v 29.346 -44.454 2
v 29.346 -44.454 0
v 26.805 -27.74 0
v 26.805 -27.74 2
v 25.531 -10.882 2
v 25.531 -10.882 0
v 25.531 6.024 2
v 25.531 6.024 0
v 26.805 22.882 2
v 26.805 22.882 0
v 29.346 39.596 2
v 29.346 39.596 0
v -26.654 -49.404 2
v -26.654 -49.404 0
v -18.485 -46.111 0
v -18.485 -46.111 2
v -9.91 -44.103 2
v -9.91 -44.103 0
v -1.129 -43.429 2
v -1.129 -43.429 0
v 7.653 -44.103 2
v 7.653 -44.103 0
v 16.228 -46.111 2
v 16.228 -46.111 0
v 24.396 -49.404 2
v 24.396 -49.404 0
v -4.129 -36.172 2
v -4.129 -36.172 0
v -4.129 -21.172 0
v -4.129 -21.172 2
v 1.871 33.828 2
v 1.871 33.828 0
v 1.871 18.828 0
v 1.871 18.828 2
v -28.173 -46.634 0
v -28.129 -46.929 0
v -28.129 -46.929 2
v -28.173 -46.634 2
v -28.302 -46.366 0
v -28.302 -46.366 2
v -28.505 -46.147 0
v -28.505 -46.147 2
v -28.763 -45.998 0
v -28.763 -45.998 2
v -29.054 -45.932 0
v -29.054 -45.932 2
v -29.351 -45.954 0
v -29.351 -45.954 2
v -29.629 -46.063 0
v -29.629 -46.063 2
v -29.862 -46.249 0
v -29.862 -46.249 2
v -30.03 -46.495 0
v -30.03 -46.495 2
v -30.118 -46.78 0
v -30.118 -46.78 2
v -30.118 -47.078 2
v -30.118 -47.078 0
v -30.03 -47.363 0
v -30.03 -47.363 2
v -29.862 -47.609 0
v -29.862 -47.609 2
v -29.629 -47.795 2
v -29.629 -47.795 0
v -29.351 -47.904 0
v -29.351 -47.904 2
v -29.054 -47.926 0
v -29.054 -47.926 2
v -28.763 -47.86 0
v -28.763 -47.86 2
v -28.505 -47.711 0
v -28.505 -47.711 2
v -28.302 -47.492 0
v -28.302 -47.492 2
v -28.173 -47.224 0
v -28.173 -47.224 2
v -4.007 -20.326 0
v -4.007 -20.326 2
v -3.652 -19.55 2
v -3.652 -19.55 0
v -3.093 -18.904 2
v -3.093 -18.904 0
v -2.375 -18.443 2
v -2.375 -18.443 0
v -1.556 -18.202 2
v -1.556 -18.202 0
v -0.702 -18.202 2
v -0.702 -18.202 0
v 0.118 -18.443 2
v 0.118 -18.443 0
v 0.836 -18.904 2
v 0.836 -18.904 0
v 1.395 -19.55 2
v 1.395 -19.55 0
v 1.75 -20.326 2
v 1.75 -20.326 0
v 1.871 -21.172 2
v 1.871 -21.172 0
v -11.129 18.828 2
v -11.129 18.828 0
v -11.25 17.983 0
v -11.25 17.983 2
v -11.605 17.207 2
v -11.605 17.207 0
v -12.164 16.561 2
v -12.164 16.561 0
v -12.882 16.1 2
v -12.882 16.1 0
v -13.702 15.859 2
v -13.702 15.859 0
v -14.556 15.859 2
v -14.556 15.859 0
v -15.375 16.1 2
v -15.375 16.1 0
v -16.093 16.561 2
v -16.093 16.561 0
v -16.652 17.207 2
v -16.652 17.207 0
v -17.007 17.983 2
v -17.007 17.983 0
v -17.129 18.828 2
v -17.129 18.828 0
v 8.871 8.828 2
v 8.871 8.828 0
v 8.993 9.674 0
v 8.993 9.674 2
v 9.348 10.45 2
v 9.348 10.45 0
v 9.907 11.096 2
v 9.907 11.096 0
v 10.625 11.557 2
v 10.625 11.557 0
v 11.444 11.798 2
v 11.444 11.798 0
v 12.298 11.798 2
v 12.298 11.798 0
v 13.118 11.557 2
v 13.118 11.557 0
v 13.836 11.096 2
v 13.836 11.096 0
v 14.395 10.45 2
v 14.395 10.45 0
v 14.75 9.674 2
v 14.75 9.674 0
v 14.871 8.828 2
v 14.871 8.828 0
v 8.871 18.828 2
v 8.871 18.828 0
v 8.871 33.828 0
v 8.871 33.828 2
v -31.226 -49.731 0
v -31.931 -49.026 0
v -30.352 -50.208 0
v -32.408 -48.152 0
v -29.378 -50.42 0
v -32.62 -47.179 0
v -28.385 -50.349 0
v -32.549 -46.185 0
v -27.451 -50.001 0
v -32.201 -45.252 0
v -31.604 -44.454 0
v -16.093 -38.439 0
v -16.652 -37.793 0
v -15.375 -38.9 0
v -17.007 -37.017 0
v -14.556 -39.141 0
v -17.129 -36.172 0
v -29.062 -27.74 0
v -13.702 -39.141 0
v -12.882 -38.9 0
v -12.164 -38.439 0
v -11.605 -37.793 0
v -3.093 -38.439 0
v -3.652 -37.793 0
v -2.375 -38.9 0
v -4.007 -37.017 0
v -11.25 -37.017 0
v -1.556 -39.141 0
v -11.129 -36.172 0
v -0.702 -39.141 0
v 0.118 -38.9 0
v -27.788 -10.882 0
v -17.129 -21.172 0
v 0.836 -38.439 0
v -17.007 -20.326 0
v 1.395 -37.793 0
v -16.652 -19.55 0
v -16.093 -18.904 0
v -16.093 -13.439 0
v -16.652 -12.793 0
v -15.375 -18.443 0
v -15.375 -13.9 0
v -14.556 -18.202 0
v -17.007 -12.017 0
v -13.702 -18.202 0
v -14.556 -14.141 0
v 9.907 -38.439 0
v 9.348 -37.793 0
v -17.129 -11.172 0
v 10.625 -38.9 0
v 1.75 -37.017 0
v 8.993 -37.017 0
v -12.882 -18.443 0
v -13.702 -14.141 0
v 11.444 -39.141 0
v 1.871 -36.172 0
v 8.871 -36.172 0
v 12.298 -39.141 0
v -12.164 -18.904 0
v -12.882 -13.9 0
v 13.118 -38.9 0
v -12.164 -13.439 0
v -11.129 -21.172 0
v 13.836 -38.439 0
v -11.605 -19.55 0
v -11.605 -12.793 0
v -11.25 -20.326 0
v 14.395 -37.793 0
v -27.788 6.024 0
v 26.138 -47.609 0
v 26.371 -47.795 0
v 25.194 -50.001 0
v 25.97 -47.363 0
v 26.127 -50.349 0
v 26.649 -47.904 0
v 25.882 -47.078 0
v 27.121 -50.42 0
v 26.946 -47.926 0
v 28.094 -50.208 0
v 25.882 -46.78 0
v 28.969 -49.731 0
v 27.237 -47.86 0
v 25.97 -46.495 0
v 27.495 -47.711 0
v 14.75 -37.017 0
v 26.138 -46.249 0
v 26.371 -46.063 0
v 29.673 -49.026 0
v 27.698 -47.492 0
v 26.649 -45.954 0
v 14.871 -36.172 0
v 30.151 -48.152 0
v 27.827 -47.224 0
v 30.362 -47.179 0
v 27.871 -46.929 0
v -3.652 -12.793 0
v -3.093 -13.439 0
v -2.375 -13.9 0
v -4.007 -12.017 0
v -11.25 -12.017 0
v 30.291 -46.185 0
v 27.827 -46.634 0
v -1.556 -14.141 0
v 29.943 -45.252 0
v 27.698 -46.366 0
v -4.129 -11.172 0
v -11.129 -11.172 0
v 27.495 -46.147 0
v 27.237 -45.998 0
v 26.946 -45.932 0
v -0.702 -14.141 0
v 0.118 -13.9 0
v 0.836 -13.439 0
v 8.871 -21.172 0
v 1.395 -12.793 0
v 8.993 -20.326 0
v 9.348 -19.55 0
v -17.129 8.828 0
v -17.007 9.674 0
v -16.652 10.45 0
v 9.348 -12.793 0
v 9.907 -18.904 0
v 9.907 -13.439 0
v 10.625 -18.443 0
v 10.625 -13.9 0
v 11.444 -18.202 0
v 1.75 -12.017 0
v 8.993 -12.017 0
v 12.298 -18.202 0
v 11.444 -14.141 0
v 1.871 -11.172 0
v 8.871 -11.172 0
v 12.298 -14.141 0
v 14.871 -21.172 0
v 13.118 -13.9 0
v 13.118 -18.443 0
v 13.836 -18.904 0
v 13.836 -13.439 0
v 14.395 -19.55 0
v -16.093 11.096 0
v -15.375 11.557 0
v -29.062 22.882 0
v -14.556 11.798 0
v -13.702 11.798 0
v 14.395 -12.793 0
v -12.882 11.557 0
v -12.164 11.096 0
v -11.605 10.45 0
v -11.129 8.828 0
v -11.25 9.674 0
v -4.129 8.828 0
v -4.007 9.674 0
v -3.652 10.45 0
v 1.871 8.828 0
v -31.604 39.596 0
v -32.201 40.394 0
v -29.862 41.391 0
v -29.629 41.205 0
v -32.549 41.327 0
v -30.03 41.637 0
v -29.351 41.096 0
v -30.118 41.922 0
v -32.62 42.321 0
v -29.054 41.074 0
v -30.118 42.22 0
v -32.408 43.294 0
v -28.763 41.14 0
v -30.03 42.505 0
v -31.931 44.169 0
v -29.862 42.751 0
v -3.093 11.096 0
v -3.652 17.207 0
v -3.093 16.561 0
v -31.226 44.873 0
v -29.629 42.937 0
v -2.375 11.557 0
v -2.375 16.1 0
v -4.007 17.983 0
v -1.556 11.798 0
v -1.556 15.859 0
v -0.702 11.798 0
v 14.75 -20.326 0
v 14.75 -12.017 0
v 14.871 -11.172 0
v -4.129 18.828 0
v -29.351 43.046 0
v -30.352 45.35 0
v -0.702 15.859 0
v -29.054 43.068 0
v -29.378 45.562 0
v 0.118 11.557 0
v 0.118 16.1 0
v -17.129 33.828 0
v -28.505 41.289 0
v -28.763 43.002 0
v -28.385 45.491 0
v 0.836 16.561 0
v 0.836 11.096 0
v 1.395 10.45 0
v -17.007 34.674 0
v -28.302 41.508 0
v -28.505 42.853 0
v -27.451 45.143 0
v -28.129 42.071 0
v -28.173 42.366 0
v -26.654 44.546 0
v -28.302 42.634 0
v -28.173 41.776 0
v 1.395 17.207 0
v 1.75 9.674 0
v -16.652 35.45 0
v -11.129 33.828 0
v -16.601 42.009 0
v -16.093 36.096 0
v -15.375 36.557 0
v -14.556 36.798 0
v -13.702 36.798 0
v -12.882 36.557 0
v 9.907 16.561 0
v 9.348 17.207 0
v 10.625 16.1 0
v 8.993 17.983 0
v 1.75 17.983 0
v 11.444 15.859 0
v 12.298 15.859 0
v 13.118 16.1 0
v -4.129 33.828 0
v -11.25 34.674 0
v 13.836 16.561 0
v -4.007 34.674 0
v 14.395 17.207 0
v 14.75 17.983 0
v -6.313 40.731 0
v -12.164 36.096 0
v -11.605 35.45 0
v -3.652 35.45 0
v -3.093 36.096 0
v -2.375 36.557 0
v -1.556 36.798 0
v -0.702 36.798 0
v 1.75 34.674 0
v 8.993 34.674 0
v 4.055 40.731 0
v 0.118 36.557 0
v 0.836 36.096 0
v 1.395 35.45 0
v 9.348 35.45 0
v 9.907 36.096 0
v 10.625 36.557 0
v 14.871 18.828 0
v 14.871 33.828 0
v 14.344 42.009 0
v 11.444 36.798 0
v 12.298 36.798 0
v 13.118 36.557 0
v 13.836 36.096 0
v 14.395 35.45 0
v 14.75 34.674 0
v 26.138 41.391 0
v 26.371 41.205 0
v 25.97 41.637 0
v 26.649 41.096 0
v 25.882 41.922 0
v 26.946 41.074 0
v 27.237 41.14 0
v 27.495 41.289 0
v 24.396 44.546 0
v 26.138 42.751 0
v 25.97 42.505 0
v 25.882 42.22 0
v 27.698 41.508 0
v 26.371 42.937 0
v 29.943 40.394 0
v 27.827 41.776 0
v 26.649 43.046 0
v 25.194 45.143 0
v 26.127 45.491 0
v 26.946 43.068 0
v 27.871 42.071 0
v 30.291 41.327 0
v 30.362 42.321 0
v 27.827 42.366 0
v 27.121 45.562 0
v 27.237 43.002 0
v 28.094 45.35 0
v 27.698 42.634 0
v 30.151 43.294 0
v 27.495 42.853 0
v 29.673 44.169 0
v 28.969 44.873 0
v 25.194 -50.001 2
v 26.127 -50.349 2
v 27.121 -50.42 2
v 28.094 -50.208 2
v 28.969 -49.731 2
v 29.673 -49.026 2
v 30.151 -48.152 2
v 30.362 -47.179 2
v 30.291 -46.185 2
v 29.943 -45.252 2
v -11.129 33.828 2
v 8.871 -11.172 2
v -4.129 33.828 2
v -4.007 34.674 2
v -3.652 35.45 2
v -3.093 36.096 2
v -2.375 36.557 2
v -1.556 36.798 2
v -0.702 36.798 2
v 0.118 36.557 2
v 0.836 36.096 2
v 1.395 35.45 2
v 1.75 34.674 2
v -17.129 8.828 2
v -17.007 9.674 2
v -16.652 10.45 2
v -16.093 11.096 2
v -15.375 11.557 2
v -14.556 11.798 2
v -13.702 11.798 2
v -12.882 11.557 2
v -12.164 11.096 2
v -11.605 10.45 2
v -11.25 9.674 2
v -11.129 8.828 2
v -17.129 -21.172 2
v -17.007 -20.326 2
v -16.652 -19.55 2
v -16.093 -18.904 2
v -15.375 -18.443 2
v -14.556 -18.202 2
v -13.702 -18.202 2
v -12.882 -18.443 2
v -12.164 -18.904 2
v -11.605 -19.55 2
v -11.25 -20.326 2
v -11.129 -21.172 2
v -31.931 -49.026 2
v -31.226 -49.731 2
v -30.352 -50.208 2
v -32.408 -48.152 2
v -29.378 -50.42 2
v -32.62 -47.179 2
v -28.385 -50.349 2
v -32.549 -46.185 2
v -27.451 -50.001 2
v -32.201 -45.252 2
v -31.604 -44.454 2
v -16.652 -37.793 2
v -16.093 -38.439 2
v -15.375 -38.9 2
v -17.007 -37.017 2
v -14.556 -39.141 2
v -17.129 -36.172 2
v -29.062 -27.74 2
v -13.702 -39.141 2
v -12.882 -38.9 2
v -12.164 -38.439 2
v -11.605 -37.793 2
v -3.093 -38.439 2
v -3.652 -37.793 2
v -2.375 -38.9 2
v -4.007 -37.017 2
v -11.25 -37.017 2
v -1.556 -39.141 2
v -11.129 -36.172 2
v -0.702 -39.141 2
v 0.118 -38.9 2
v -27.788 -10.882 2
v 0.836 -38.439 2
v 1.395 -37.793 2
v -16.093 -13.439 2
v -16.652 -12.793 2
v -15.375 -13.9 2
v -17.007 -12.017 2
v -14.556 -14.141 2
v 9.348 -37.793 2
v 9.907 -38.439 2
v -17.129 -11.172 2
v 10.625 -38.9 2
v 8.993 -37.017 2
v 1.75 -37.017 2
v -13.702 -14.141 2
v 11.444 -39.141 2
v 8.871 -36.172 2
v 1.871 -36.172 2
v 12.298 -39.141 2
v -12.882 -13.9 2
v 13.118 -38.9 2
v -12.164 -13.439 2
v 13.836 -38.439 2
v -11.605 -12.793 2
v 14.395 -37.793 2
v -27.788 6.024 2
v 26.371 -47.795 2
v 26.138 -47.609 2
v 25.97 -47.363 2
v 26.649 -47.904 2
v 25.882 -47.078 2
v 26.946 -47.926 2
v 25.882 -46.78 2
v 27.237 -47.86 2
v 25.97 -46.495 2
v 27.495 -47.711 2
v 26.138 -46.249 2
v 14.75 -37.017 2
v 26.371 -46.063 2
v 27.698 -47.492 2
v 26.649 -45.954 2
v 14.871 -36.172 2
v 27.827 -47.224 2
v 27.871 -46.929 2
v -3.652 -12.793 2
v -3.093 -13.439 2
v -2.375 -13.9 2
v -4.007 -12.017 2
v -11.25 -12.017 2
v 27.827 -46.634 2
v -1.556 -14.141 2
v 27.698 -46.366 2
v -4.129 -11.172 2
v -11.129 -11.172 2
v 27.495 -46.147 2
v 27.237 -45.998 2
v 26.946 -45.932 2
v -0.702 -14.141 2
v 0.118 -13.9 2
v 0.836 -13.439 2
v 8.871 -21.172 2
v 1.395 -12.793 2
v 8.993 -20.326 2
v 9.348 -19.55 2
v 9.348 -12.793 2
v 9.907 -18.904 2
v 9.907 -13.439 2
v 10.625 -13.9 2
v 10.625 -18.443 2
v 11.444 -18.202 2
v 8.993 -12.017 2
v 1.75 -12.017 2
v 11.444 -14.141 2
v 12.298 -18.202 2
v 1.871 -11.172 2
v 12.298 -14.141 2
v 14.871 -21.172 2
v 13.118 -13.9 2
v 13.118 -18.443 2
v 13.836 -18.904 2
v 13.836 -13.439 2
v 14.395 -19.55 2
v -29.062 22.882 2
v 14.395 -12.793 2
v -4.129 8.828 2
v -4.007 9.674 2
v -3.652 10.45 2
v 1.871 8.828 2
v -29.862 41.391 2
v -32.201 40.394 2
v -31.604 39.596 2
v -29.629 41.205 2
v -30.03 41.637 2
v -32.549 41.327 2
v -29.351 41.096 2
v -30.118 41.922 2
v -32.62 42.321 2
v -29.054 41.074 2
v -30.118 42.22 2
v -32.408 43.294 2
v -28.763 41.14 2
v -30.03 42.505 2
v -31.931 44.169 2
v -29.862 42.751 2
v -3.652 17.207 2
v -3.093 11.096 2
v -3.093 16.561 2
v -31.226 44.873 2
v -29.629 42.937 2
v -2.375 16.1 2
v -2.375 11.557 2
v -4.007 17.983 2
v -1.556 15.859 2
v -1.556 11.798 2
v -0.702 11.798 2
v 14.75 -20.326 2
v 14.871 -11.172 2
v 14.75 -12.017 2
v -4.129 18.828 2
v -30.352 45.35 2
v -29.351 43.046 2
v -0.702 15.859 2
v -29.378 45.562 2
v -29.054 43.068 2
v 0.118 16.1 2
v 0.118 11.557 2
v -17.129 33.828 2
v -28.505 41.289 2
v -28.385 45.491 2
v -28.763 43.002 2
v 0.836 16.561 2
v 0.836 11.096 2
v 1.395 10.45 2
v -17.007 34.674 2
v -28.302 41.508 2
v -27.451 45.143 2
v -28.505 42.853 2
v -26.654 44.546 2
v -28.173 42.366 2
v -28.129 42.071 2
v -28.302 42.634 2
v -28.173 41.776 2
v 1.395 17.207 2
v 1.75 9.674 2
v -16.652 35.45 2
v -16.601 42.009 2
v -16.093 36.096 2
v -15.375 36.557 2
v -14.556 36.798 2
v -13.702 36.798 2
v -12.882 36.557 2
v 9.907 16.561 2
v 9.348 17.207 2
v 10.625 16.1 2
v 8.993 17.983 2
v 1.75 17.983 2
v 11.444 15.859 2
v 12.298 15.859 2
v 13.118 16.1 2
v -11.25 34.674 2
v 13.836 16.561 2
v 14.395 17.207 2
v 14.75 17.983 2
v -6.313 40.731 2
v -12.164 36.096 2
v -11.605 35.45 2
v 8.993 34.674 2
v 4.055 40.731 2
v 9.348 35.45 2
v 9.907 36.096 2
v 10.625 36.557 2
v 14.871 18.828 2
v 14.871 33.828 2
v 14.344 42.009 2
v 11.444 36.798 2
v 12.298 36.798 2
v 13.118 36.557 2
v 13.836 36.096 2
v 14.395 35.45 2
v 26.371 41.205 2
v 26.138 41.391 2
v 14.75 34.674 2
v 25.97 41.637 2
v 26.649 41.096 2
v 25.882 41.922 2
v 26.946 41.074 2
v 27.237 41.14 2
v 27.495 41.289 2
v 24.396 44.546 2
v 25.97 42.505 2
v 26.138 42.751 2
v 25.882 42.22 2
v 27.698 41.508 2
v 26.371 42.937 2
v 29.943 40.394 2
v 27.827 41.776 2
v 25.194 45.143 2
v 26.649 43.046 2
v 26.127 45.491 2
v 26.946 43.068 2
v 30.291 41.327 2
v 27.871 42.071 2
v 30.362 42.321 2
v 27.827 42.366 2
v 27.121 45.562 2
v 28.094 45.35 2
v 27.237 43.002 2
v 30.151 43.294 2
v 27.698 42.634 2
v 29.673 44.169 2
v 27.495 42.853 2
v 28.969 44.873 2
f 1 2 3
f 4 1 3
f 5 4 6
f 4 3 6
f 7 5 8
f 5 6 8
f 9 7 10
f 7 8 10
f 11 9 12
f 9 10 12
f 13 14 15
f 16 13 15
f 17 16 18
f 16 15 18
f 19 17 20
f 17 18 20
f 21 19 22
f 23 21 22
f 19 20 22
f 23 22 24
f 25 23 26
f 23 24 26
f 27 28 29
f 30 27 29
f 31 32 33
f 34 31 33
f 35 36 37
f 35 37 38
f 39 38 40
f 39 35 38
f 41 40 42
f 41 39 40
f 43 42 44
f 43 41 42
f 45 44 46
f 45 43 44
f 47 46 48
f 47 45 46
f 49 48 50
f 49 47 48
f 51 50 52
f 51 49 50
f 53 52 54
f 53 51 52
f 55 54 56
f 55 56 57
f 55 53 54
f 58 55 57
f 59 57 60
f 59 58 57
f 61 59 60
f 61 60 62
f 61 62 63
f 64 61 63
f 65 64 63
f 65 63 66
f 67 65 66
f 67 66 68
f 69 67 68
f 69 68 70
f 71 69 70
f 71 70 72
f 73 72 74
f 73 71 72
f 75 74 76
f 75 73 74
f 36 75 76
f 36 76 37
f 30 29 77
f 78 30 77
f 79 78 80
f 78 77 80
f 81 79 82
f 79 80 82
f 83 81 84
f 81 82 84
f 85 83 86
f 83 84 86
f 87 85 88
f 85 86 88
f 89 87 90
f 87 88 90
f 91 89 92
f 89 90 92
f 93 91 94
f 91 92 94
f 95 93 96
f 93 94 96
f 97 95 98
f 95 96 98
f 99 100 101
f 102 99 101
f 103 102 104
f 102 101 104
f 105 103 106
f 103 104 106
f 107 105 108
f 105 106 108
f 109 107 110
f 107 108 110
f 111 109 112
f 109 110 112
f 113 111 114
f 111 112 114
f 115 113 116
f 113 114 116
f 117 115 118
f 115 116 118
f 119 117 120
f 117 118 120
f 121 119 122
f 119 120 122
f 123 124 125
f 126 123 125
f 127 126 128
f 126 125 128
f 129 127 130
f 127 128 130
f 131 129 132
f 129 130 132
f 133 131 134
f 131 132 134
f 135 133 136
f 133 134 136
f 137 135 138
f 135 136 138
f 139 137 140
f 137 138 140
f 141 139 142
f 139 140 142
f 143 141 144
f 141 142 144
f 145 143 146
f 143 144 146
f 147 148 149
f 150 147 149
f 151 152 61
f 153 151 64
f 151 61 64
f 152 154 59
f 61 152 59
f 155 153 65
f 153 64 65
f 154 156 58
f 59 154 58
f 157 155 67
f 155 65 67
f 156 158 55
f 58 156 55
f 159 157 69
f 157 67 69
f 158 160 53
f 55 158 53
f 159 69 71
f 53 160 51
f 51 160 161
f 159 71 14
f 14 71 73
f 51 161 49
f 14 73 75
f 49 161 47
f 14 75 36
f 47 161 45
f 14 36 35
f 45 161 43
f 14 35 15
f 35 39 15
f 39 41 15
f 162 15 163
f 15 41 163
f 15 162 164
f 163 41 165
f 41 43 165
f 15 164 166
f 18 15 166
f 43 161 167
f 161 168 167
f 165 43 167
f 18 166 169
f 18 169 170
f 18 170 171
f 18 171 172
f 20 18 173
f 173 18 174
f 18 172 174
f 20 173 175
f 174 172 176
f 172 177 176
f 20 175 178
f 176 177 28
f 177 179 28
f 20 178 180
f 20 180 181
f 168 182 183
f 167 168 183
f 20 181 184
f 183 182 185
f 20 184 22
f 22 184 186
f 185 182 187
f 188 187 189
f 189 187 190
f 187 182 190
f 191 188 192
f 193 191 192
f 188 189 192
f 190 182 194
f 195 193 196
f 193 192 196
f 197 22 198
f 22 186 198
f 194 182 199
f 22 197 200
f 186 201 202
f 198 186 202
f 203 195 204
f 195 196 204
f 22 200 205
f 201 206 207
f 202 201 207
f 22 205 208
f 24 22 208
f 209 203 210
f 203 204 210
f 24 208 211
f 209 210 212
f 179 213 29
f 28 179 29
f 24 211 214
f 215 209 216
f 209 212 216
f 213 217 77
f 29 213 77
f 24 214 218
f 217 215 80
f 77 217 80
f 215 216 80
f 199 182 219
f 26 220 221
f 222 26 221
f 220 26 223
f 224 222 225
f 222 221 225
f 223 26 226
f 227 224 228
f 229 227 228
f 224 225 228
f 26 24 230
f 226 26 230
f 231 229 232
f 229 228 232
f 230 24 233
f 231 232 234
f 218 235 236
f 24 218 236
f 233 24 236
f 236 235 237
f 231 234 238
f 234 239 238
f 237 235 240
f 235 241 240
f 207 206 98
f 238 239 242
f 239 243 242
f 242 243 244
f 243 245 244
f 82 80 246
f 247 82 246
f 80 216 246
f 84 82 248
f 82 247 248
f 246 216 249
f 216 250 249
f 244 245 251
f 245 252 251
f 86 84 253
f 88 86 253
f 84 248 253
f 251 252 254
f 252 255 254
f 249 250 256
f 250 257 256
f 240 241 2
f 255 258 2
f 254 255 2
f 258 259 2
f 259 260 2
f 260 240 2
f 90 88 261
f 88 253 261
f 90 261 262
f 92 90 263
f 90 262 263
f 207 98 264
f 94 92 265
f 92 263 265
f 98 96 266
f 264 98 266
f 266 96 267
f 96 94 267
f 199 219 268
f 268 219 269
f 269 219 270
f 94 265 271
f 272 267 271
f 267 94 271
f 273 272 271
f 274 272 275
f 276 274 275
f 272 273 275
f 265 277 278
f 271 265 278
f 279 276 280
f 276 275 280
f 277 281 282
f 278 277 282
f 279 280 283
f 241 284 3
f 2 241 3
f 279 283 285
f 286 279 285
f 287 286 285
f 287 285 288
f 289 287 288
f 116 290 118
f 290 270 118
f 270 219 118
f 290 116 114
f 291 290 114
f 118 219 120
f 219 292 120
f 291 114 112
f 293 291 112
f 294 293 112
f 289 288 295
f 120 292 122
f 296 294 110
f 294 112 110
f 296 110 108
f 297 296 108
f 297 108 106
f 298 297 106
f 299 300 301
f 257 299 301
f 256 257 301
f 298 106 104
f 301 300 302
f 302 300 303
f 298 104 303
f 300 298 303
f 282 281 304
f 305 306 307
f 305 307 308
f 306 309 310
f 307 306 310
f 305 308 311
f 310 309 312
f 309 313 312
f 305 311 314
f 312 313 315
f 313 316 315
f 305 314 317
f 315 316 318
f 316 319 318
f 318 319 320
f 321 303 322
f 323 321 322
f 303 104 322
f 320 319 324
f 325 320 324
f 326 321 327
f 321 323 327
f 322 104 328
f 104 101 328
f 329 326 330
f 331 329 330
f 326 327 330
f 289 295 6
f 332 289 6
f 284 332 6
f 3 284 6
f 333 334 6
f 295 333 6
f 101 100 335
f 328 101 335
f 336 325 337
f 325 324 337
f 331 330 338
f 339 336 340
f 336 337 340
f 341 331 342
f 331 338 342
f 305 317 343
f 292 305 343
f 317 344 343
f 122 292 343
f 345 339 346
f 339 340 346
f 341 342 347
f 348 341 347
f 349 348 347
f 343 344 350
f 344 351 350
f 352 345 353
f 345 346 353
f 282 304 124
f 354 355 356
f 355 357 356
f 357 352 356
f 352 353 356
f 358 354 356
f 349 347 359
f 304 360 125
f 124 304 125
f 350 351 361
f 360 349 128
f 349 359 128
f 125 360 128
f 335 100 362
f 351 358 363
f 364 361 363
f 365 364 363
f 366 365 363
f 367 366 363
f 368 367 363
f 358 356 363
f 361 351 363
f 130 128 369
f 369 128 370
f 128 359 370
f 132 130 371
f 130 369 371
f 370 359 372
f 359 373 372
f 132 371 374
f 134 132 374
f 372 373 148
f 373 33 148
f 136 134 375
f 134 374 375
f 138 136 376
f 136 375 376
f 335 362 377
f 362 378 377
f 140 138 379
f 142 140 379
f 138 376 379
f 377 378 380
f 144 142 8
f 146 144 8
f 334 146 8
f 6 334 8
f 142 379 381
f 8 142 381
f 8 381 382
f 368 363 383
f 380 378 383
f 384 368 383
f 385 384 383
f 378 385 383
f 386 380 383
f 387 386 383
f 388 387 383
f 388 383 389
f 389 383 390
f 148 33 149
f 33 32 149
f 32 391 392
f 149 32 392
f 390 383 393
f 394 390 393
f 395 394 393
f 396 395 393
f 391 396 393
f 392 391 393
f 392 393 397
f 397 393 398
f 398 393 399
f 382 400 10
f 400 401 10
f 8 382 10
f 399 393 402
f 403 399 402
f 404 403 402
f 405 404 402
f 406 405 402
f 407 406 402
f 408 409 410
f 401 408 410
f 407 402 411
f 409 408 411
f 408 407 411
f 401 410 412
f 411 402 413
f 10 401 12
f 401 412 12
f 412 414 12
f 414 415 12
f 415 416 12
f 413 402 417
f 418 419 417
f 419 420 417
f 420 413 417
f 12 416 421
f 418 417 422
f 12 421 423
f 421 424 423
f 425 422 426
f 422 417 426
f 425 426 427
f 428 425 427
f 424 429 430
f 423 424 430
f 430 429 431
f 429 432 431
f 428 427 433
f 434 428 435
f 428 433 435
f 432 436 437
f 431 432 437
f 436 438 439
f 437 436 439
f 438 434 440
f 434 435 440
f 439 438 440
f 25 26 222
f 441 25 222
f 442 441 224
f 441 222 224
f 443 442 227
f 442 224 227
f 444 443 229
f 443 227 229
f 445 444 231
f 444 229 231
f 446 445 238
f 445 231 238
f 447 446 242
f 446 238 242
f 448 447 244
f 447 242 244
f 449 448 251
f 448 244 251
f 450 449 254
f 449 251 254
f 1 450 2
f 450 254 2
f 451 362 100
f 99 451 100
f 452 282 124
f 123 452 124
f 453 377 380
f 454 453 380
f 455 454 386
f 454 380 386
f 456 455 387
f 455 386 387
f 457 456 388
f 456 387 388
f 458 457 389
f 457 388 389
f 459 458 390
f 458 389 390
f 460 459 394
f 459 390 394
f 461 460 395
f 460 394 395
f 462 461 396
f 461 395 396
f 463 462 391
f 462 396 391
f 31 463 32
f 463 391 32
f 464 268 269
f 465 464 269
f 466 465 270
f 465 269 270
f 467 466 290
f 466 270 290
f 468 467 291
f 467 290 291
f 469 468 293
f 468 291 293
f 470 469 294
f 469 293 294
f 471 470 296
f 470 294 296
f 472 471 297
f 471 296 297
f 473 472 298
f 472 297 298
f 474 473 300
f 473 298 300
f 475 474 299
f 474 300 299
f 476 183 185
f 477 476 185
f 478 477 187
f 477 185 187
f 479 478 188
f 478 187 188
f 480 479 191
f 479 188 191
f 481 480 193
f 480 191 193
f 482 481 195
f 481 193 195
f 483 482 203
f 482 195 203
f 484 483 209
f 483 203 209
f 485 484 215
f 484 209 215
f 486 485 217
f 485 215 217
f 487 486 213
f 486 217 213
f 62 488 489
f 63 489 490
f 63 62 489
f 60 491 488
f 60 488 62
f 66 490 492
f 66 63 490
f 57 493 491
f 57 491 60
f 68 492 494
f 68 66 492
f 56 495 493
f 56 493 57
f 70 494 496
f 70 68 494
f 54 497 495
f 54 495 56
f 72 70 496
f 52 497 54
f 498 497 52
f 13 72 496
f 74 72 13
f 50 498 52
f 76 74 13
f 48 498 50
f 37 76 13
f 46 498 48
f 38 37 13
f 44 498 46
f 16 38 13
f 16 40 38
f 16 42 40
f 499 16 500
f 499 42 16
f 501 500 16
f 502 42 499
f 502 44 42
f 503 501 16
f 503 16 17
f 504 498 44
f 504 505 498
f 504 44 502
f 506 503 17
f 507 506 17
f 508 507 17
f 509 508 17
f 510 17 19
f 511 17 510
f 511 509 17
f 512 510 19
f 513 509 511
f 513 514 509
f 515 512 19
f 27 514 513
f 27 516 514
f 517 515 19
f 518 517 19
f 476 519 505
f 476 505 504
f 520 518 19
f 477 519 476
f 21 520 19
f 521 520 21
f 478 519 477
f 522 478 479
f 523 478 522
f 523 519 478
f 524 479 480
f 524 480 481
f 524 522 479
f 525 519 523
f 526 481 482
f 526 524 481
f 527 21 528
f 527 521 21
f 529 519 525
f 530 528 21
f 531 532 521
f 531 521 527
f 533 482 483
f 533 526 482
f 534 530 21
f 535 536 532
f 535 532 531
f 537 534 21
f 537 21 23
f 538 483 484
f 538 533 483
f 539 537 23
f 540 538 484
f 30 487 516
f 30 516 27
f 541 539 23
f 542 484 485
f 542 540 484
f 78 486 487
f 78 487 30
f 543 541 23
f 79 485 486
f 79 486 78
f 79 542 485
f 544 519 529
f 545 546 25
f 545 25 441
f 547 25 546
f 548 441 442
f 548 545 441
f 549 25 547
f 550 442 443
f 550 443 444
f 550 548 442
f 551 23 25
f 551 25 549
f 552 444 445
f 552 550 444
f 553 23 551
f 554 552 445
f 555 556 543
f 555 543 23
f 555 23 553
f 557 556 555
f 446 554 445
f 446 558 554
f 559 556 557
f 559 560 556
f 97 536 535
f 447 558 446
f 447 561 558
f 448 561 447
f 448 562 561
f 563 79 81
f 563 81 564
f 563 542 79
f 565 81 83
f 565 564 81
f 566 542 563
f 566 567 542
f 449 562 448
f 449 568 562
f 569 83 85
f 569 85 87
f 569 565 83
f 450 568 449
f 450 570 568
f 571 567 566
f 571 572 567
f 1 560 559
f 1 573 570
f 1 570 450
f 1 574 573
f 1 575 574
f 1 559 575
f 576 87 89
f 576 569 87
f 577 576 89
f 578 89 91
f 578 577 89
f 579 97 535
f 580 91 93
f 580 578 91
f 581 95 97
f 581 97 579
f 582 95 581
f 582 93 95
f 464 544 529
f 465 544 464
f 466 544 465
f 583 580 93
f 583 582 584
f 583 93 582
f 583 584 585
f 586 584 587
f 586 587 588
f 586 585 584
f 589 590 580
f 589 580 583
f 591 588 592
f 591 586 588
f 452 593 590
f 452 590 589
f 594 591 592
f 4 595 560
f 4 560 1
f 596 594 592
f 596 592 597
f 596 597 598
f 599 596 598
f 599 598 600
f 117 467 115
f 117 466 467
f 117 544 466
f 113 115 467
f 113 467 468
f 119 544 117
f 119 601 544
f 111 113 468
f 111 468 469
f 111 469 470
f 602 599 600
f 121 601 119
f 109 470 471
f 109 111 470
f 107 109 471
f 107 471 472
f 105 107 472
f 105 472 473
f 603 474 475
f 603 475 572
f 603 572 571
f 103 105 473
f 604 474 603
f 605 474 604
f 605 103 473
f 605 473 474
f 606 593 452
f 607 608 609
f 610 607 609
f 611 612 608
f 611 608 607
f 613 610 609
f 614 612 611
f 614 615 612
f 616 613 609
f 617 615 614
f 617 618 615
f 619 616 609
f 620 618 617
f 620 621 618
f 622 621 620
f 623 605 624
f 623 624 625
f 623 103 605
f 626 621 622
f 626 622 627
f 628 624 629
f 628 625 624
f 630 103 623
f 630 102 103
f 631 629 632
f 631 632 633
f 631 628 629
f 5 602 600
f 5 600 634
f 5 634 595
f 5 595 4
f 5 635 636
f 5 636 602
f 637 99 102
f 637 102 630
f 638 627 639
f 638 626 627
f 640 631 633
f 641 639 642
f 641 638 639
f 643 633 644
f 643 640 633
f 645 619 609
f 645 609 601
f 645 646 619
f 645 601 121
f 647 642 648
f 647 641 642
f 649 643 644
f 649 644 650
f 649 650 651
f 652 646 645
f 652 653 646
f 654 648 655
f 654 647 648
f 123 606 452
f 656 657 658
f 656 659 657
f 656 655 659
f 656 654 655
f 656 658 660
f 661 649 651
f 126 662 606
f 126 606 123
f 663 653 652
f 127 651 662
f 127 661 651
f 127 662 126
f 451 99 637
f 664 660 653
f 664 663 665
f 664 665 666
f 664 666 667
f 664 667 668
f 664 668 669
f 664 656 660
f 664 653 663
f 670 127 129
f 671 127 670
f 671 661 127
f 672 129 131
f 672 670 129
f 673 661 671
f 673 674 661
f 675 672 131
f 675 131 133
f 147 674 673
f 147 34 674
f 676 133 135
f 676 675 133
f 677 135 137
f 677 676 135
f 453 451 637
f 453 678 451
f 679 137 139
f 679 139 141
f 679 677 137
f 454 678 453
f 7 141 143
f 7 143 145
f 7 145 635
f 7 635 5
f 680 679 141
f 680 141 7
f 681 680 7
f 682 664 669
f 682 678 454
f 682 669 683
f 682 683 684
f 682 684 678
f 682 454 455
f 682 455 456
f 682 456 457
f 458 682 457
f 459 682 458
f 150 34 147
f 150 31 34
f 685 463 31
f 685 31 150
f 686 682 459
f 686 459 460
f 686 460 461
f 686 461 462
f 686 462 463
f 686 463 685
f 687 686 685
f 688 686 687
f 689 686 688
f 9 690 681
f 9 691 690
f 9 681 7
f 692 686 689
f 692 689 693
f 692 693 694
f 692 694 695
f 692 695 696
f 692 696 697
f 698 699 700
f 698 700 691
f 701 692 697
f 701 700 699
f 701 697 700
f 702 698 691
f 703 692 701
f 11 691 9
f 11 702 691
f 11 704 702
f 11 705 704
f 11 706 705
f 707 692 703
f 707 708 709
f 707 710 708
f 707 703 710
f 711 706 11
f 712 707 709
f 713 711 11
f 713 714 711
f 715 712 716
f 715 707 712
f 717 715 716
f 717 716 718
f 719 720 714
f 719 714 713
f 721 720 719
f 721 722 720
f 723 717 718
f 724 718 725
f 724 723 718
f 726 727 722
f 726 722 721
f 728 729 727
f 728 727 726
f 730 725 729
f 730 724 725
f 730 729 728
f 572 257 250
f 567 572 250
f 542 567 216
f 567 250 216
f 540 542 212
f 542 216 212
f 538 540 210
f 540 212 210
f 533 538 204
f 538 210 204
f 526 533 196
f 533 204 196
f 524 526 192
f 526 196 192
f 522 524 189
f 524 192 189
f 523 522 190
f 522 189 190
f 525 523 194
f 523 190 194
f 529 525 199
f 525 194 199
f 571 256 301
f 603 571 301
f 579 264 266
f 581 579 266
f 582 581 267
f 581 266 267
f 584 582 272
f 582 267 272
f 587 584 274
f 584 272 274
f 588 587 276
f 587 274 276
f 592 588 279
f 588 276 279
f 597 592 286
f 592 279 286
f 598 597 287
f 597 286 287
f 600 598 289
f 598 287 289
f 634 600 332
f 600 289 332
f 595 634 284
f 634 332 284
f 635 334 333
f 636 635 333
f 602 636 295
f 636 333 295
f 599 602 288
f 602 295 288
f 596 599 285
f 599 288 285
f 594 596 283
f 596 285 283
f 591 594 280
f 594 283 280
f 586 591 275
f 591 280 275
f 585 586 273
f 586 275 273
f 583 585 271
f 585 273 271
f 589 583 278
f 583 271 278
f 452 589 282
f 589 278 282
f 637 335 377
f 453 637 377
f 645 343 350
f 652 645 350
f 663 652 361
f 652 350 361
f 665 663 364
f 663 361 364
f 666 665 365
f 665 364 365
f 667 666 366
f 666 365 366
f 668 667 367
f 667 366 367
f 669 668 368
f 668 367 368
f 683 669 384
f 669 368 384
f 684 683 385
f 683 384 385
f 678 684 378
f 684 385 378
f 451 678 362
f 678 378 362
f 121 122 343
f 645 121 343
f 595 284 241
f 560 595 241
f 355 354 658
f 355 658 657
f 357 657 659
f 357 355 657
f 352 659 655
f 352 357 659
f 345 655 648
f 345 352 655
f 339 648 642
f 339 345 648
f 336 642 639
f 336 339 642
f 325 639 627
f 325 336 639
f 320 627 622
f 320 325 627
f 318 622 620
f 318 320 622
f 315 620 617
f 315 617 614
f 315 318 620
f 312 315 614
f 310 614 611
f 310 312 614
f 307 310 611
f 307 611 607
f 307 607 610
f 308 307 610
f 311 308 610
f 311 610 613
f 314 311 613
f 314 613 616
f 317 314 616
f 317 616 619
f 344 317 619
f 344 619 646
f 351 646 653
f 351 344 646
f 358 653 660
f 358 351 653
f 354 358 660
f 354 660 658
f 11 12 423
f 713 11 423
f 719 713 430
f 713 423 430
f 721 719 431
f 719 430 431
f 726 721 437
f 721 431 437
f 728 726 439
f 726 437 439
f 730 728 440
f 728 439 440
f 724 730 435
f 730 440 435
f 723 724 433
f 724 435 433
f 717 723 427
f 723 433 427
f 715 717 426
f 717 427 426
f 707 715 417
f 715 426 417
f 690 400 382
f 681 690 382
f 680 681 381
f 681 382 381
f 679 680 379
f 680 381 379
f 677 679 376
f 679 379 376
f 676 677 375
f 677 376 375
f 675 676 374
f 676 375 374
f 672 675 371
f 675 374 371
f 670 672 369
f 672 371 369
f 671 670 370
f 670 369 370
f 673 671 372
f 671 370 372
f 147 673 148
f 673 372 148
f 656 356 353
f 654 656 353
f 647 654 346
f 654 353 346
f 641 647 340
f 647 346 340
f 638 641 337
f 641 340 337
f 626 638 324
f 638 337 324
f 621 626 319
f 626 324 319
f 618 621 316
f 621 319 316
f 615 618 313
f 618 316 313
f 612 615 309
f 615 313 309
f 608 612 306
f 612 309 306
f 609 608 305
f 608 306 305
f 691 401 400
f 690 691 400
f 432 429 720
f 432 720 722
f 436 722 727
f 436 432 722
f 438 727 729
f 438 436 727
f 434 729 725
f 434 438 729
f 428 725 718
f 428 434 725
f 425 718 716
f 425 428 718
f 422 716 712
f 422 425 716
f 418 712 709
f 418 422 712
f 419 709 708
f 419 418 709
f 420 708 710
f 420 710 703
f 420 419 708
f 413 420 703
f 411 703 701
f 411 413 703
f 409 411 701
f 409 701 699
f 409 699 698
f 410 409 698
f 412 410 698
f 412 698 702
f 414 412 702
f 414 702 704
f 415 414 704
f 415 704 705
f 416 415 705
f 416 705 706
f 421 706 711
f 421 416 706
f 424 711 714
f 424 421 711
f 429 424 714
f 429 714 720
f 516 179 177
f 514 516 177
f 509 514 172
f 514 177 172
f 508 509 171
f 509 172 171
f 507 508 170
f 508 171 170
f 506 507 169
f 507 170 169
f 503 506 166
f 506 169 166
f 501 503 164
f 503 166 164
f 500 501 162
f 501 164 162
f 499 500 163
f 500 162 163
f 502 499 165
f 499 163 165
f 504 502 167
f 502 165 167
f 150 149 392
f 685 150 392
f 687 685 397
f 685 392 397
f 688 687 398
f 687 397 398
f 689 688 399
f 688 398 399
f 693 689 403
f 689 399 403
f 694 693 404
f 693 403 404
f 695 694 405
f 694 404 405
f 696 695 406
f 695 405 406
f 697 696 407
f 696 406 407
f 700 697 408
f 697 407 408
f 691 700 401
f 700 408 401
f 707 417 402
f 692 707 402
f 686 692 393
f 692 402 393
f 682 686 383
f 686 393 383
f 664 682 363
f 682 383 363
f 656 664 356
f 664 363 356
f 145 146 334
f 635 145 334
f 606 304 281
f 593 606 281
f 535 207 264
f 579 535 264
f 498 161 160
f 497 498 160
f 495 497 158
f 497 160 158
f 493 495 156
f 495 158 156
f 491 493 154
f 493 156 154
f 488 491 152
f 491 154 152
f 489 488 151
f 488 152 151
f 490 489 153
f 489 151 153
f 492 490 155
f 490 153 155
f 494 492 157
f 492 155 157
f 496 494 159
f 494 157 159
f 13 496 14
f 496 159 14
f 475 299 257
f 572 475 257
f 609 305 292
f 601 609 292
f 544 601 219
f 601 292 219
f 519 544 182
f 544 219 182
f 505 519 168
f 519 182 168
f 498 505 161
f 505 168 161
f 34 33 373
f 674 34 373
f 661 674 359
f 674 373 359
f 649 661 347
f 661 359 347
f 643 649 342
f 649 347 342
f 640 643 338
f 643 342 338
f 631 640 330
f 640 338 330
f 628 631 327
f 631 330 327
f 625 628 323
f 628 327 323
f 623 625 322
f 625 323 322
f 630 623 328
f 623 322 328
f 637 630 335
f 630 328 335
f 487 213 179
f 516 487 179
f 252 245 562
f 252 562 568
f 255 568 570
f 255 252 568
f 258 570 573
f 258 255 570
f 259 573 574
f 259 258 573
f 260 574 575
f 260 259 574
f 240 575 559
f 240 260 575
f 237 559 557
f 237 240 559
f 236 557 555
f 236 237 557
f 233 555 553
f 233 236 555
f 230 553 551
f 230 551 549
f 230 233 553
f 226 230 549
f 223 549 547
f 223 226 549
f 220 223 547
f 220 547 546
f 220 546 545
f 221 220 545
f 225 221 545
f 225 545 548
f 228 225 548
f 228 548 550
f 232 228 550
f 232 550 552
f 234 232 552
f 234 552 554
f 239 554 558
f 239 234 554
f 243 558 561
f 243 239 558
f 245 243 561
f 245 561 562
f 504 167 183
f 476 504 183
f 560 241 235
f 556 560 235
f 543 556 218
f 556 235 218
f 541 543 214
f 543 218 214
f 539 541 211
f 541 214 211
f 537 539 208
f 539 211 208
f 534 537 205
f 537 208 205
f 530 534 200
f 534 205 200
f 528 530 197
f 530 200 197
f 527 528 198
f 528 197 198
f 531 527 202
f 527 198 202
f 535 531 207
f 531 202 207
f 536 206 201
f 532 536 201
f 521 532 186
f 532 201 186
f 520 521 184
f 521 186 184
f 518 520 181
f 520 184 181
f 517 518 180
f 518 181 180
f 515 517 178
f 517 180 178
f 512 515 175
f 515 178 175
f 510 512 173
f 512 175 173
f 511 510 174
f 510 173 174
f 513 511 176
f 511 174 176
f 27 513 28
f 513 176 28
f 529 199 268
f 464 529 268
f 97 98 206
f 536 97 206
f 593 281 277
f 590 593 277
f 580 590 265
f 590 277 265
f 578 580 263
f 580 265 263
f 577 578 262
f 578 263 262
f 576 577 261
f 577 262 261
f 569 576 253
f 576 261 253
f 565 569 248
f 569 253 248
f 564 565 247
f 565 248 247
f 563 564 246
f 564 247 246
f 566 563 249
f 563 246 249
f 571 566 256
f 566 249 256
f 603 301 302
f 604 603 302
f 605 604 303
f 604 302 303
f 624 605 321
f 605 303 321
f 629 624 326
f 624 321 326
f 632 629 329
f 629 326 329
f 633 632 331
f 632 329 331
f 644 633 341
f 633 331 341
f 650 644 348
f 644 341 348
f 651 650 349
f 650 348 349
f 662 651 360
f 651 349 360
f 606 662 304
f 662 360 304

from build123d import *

# Parameters (mm, degrees)
F0_R     = 1
F1_DEPTH = 2


with BuildPart() as f1:
    # F0 (on Top) → F1 (new body)
    with BuildSketch(Plane.XY):
        with BuildLine():
            ThreePointArc((29.346194, 39.596192), (29.346194, 44.545939), (24.396447, 44.545939))
            ThreePointArc((24.396447, 44.545939), (-1.12868, 40.571065), (-26.653806, 44.545939))
            ThreePointArc((-26.653806, 44.545939), (-31.603553, 44.545939), (-31.603553, 39.596192))
            ThreePointArc((-31.603553, 39.596192), (-27.62868, -2.428935), (-31.603553, -44.454061))
            ThreePointArc((-31.603553, -44.454061), (-31.603553, -49.403808), (-26.653806, -49.403808))
            ThreePointArc((-26.653806, -49.403808), (-1.12868, -43.428935), (24.396447, -49.403808))
            ThreePointArc((24.396447, -49.403808), (29.346194, -49.403808), (29.346194, -44.454061))
            ThreePointArc((29.346194, -44.454061), (25.37132, -2.428935), (29.346194, 39.596192))
        make_face()
        with Locations((-29.12868, -46.928935)):
            Circle(F0_R, mode=Mode.SUBTRACT)
        with BuildLine():
            Line((-17.12868, -36.171575), (-17.12868, -21.171575))
            ThreePointArc((-17.12868, -21.171575), (-14.12868, -18.171575), (-11.12868, -21.171575))
            Line((-11.12868, -21.171575), (-11.12868, -36.171575))
            ThreePointArc((-11.12868, -36.171575), (-14.12868, -39.171575), (-17.12868, -36.171575))
        make_face(mode=Mode.SUBTRACT)
        with BuildLine():
            Line((-4.12868, -36.171575), (-4.12868, -21.171575))
            ThreePointArc((-4.12868, -21.171575), (-1.12868, -18.171575), (1.87132, -21.171575))
            Line((1.87132, -21.171575), (1.87132, -36.171575))
            ThreePointArc((1.87132, -36.171575), (-1.12868, -39.171575), (-4.12868, -36.171575))
        make_face(mode=Mode.SUBTRACT)
        with BuildLine():
            Line((8.87132, -36.171575), (8.87132, -21.171575))
            ThreePointArc((8.87132, -21.171575), (11.87132, -18.171575), (14.87132, -21.171575))
            Line((14.87132, -21.171575), (14.87132, -36.171575))
            ThreePointArc((14.87132, -36.171575), (11.87132, -39.171575), (8.87132, -36.171575))
        make_face(mode=Mode.SUBTRACT)
        with Locations((26.87132, -46.928935)):
            Circle(F0_R, mode=Mode.SUBTRACT)
        with BuildLine():
            Line((-17.12868, -11.171575), (-17.12868, 8.828425))
            ThreePointArc((-17.12868, 8.828425), (-14.12868, 11.828425), (-11.12868, 8.828425))
            Line((-11.12868, 8.828425), (-11.12868, -11.171575))
            ThreePointArc((-11.12868, -11.171575), (-14.12868, -14.171575), (-17.12868, -11.171575))
        make_face(mode=Mode.SUBTRACT)
        with Locations((-29.12868, 42.071065)):
            Circle(F0_R, mode=Mode.SUBTRACT)
        with BuildLine():
            Line((-17.12868, 18.828425), (-17.12868, 33.828425))
            ThreePointArc((-17.12868, 33.828425), (-14.12868, 36.828425), (-11.12868, 33.828425))
            Line((-11.12868, 33.828425), (-11.12868, 18.828425))
            ThreePointArc((-11.12868, 18.828425), (-14.12868, 15.828425), (-17.12868, 18.828425))
        make_face(mode=Mode.SUBTRACT)
        with BuildLine():
            Line((-4.12868, -11.171575), (-4.12868, 8.828425))
            ThreePointArc((-4.12868, 8.828425), (-1.12868, 11.828425), (1.87132, 8.828425))
            Line((1.87132, 8.828425), (1.87132, -11.171575))
            ThreePointArc((1.87132, -11.171575), (-1.12868, -14.171575), (-4.12868, -11.171575))
        make_face(mode=Mode.SUBTRACT)
        with BuildLine():
            Line((8.87132, -11.171575), (8.87132, 8.828425))
            ThreePointArc((8.87132, 8.828425), (11.87132, 11.828425), (14.87132, 8.828425))
            Line((14.87132, 8.828425), (14.87132, -11.171575))
            ThreePointArc((14.87132, -11.171575), (11.87132, -14.171575), (8.87132, -11.171575))
        make_face(mode=Mode.SUBTRACT)
        with BuildLine():
            Line((-4.12868, 18.828425), (-4.12868, 33.828425))
            ThreePointArc((-4.12868, 33.828425), (-1.12868, 36.828425), (1.87132, 33.828425))
            Line((1.87132, 33.828425), (1.87132, 18.828425))
            ThreePointArc((1.87132, 18.828425), (-1.12868, 15.828425), (-4.12868, 18.828425))
        make_face(mode=Mode.SUBTRACT)
        with BuildLine():
            Line((8.87132, 18.828425), (8.87132, 33.828425))
            ThreePointArc((8.87132, 33.828425), (11.87132, 36.828425), (14.87132, 33.828425))
            Line((14.87132, 33.828425), (14.87132, 18.828425))
            ThreePointArc((14.87132, 18.828425), (11.87132, 15.828425), (8.87132, 18.828425))
        make_face(mode=Mode.SUBTRACT)
        with Locations((26.87132, 42.071065)):
            Circle(F0_R, mode=Mode.SUBTRACT)
    extrude(amount=F1_DEPTH)


solid = f1.part
